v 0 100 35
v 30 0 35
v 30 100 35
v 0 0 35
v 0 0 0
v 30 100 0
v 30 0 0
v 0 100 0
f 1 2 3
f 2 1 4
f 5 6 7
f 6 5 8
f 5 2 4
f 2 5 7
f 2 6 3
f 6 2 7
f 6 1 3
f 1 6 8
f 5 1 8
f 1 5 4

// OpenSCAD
width=30;
height = 100;
depth=35;

cube([width,height,depth]);
